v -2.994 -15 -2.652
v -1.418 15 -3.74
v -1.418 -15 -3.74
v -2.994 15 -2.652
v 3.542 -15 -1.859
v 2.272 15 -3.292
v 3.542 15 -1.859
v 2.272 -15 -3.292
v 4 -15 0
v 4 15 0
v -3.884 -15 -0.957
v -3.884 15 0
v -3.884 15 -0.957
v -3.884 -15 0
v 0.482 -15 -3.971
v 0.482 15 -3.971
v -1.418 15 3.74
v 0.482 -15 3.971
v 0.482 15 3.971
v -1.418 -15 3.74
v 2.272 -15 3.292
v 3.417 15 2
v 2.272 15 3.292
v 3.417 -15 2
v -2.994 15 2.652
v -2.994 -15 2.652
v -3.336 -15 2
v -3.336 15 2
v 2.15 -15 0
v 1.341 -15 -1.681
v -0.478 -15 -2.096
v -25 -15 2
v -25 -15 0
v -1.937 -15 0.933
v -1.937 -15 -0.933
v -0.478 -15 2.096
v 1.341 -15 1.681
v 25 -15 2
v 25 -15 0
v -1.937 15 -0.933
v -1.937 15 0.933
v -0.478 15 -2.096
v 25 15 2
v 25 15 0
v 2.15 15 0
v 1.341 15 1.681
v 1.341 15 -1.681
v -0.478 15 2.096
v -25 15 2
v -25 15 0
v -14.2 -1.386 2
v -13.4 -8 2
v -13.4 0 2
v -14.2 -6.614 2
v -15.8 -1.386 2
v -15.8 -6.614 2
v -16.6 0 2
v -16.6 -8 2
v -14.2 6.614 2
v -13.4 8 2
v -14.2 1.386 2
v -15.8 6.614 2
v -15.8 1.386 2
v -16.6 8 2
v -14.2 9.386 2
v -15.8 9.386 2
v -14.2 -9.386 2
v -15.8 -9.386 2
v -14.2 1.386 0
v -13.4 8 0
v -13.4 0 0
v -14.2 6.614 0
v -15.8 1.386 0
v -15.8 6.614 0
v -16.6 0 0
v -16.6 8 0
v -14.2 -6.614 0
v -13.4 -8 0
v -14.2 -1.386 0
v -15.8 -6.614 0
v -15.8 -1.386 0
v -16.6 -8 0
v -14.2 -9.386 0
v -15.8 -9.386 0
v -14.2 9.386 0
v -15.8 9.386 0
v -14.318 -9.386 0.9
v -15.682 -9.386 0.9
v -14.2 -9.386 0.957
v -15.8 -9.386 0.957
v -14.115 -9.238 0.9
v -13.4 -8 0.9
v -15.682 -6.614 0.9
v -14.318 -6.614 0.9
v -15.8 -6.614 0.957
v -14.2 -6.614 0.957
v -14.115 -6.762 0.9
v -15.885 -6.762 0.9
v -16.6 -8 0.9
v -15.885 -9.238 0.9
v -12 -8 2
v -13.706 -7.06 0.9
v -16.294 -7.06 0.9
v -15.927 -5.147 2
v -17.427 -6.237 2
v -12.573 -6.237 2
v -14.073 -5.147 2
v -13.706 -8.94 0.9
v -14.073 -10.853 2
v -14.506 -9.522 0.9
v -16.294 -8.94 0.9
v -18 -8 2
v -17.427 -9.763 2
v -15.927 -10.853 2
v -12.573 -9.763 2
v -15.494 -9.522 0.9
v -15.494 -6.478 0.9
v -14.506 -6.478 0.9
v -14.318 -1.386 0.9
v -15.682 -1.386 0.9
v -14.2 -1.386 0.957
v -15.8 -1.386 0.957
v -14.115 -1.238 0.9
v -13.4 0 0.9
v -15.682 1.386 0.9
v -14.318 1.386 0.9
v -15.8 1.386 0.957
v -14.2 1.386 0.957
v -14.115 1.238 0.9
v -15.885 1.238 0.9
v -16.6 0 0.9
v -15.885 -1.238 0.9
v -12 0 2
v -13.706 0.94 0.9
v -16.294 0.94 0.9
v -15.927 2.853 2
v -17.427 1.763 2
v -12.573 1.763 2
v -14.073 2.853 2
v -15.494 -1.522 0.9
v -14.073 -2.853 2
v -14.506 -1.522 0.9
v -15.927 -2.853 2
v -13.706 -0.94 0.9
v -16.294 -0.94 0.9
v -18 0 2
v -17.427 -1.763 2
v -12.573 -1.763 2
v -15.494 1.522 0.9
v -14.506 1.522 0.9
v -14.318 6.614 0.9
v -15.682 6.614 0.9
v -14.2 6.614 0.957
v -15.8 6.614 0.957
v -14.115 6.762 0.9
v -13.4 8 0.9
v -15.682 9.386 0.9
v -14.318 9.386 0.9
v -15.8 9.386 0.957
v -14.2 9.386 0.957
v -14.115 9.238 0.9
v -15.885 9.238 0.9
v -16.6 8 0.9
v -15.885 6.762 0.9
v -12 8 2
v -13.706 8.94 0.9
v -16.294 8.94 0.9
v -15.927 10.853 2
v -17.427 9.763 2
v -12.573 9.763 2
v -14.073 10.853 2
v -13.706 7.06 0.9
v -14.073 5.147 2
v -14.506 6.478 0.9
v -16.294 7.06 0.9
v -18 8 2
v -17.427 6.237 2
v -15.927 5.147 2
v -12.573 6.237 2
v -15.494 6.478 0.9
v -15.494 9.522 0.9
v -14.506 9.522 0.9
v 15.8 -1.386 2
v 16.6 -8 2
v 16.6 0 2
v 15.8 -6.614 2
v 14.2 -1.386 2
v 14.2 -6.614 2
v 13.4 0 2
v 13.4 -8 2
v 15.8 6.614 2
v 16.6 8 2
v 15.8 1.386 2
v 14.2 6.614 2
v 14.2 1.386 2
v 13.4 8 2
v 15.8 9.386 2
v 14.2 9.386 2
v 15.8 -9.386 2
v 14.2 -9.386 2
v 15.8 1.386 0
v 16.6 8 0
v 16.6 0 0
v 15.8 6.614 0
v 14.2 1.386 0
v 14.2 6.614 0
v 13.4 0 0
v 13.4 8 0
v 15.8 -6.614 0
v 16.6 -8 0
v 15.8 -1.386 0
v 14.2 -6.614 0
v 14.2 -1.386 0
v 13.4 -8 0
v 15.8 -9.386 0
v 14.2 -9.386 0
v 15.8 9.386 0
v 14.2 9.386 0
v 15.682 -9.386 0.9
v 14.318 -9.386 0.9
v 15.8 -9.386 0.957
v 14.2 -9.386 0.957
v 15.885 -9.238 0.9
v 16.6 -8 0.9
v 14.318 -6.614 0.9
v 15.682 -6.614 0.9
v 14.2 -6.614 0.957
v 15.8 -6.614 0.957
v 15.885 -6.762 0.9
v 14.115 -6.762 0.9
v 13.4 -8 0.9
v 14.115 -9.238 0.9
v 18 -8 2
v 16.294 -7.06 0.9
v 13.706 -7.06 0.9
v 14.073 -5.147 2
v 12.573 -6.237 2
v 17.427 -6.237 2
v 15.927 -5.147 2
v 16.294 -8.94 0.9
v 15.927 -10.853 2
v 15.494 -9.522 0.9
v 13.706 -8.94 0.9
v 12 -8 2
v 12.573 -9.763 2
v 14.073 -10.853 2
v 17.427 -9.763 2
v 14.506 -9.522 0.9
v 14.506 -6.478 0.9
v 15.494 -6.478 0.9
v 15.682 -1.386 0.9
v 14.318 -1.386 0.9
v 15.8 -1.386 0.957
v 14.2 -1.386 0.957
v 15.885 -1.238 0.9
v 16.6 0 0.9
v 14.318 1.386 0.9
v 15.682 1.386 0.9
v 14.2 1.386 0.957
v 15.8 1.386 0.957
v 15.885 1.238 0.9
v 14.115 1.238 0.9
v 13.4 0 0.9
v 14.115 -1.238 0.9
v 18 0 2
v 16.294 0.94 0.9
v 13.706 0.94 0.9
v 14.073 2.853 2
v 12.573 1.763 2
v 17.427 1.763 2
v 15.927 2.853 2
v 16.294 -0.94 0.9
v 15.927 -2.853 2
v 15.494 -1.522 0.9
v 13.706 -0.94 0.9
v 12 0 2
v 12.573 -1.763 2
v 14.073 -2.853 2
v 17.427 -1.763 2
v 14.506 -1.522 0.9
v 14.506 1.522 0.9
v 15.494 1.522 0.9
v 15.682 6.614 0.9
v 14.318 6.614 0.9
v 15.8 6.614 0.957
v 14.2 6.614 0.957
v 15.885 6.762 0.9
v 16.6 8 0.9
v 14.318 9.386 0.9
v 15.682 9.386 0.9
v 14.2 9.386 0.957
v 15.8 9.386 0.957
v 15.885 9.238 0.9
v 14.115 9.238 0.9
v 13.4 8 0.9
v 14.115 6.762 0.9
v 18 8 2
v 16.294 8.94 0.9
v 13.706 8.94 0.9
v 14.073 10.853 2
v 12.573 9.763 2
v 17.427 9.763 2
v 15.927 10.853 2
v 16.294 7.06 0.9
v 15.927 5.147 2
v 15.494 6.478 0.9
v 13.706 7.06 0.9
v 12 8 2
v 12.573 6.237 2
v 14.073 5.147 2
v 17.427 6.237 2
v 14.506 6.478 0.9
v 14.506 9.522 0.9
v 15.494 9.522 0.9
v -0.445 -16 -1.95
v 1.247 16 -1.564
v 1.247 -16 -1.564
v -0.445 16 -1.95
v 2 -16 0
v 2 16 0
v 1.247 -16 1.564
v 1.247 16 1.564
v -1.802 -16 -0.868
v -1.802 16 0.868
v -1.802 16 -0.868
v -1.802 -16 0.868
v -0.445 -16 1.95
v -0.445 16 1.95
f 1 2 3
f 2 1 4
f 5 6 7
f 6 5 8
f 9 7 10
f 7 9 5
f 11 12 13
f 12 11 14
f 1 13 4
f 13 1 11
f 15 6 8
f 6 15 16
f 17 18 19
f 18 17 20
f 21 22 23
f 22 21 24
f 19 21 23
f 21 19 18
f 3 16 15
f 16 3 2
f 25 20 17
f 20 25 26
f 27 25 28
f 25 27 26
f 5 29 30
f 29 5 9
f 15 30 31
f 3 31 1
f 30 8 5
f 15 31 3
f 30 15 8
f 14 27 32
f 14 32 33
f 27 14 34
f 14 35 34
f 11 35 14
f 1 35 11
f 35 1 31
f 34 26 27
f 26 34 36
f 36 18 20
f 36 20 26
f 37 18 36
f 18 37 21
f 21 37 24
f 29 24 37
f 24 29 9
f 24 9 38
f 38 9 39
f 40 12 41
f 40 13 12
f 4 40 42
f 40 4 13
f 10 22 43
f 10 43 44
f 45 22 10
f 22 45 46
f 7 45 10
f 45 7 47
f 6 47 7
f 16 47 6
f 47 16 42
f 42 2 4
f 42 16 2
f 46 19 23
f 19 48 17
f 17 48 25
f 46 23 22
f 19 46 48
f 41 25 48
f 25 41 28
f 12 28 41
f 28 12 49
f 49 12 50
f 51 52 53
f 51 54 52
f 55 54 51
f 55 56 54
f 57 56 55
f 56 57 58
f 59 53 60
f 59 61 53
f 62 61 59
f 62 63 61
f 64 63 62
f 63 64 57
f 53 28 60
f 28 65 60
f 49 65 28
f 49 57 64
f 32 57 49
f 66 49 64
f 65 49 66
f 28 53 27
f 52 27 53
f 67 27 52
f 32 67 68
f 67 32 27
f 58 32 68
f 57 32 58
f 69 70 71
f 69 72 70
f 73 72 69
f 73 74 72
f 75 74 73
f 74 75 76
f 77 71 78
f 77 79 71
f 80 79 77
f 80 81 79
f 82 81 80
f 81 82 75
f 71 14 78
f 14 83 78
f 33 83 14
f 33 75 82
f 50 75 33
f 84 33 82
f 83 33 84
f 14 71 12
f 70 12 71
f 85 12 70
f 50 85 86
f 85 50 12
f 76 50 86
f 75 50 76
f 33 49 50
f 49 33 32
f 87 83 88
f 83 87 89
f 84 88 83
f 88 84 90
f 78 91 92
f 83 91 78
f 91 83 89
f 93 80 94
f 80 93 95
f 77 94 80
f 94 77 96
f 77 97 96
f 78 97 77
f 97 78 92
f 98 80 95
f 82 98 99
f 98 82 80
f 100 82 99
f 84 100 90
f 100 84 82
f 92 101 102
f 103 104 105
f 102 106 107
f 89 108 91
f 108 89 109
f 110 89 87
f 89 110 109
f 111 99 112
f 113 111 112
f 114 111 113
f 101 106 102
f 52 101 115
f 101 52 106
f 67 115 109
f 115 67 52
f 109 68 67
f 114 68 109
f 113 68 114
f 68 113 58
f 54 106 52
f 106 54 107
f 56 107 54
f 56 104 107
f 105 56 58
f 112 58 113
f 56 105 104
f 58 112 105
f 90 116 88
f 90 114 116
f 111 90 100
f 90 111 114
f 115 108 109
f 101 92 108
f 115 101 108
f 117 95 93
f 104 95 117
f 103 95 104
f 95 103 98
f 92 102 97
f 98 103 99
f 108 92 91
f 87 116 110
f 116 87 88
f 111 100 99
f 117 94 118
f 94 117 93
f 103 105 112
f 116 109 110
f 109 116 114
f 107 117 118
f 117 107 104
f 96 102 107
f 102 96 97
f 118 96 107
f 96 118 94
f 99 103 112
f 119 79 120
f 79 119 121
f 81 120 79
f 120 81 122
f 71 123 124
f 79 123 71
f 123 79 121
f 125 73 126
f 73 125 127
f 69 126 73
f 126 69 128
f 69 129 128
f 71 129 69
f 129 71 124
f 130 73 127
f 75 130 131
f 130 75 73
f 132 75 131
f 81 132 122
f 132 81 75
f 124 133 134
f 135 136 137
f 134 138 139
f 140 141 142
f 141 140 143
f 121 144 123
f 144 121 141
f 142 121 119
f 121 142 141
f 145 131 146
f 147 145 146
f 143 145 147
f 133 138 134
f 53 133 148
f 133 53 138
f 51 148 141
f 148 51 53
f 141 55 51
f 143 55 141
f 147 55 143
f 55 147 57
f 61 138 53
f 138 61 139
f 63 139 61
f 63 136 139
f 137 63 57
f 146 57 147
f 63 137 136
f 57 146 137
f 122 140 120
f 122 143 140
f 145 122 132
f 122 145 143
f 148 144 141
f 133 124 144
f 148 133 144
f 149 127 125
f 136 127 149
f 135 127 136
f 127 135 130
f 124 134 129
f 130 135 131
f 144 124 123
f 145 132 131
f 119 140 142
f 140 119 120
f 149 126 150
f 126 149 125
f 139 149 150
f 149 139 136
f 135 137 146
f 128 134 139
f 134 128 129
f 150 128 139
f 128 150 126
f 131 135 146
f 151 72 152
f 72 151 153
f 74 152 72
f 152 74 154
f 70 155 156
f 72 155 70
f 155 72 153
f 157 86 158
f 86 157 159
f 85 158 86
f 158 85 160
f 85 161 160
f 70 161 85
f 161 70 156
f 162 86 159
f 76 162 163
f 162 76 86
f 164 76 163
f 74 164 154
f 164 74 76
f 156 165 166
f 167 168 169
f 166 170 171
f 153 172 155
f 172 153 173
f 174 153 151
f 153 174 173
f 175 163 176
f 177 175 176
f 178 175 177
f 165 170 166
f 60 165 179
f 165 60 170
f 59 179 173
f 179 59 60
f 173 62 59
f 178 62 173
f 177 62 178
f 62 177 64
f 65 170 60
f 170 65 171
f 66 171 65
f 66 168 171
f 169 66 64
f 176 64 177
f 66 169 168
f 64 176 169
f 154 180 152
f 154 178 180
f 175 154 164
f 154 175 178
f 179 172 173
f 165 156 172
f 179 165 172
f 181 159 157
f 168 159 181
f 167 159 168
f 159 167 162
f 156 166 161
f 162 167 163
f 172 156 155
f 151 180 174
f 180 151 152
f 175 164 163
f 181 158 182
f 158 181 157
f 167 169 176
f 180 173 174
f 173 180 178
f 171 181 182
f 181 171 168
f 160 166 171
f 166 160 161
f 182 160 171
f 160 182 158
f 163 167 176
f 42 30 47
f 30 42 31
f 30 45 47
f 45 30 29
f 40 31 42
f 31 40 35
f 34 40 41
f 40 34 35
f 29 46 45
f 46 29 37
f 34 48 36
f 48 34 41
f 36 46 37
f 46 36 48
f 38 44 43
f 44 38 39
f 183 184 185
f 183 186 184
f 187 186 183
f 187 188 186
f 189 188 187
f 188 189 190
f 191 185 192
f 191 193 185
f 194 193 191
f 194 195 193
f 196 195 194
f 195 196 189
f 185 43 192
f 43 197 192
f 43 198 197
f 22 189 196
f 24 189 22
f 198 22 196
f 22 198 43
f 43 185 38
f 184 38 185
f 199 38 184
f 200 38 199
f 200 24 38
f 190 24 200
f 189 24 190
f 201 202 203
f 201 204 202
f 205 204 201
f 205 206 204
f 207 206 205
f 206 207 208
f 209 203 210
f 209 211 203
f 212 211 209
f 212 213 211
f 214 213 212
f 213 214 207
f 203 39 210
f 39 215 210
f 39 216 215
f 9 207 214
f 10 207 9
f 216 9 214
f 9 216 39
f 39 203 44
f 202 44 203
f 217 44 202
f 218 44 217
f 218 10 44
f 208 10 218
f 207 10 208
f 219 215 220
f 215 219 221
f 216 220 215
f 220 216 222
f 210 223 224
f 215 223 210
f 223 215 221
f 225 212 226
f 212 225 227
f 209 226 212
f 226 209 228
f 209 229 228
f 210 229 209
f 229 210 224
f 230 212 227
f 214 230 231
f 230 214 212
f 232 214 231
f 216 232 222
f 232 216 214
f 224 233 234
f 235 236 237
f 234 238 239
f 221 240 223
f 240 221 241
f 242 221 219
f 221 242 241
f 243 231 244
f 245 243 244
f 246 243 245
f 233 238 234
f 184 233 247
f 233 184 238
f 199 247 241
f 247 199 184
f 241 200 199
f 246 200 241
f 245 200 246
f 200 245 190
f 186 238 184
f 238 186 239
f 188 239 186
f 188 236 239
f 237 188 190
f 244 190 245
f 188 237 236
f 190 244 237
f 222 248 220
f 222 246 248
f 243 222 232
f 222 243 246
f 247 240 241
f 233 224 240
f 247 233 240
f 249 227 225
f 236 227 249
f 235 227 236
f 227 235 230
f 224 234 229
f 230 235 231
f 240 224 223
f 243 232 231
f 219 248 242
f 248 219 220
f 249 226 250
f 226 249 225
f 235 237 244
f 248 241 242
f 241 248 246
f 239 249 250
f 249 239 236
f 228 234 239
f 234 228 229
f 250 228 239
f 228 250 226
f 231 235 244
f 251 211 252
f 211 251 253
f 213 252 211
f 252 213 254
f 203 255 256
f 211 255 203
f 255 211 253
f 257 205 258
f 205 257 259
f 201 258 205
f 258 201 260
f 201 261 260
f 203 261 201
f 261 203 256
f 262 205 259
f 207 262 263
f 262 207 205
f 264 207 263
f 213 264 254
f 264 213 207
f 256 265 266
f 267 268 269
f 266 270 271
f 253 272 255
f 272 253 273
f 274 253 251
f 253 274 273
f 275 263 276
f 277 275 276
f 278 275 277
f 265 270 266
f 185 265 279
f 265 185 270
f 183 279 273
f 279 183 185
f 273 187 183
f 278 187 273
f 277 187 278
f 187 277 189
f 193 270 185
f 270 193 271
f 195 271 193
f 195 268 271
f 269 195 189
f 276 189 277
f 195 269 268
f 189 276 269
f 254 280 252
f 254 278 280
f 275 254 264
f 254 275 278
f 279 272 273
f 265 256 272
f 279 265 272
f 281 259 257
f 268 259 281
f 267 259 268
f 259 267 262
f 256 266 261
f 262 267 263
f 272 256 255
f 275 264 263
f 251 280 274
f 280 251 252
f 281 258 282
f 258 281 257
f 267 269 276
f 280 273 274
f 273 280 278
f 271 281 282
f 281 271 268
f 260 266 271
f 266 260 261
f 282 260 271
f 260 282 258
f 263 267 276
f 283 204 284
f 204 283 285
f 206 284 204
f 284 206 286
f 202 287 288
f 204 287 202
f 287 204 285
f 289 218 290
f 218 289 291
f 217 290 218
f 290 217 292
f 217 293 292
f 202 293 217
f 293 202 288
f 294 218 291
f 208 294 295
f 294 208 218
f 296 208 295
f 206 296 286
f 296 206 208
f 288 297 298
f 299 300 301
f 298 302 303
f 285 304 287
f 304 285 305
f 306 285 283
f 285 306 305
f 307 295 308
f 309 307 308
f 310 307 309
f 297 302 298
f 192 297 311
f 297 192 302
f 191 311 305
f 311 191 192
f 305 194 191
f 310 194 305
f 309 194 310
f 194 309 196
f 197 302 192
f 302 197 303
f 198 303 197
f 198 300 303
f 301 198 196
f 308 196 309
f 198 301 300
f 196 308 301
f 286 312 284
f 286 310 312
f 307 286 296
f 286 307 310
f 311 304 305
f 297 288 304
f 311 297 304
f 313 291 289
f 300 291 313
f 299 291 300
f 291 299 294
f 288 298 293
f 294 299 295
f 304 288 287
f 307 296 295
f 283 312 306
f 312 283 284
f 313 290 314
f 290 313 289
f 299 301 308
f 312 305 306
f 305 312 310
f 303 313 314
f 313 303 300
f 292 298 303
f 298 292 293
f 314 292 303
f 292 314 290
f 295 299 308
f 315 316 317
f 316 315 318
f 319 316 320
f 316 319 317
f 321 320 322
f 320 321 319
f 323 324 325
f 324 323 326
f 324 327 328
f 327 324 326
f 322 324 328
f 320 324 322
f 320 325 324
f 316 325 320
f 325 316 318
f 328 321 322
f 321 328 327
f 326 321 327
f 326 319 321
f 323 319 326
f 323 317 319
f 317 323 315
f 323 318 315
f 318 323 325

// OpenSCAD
// Parameters
leaf_width = 25;
leaf_height = 30;
leaf_thick = 2;
pin_diam = 4;
pin_clearance = 0.3;
knuckle_od = 8;
knuckle_id = pin_diam + pin_clearance;
knuckle_len = leaf_height / 5;
hole_pitch = 8;

module hinge_leaf(is_left = true) {
    difference() {
        union() {
            // Plate
            translate([is_left ? -leaf_width : 0, -leaf_height / 2, 0])
                cube([leaf_width, leaf_height, leaf_thick]);
            
            // Knuckles
            for (i = [0:4]) {
                if ((is_left && (i == 0 || i == 2 || i == 4)) || (!is_left && (i == 1 || i == 3))) {
                    translate([0, -leaf_height / 2 + i * knuckle_len + knuckle_len / 2, 0])
                        rotate([-90, 0, 0])
                        cylinder(d = knuckle_od, h = knuckle_len, center = true);
                }
            }
        }
        
        // Pin hole
        rotate([-90, 0, 0])
            cylinder(d = knuckle_id, h = leaf_height + 1, center = true);
        
        // Countersunk holes
        for (i = [-1:1]) {
            y_pos = i * hole_pitch;
            x_pos = is_left ? -15 : 15;
            translate([x_pos, y_pos, -0.1]) {
                cylinder(d = 3.2, h = leaf_thick + 0.2);
                translate([0, 0, leaf_thick - 1])
                    cylinder(d1 = 3.2, d2 = 6, h = 1.1);
            }
        }
    }
}

// Main assembly
union() {
    // Left leaf
    hinge_leaf(true);
    
    // Right leaf
    hinge_leaf(false);
    
    // Pin
    color("silver")
        rotate([-90, 0, 0])
        cylinder(d = pin_diam, h = 32, center = true);
}
